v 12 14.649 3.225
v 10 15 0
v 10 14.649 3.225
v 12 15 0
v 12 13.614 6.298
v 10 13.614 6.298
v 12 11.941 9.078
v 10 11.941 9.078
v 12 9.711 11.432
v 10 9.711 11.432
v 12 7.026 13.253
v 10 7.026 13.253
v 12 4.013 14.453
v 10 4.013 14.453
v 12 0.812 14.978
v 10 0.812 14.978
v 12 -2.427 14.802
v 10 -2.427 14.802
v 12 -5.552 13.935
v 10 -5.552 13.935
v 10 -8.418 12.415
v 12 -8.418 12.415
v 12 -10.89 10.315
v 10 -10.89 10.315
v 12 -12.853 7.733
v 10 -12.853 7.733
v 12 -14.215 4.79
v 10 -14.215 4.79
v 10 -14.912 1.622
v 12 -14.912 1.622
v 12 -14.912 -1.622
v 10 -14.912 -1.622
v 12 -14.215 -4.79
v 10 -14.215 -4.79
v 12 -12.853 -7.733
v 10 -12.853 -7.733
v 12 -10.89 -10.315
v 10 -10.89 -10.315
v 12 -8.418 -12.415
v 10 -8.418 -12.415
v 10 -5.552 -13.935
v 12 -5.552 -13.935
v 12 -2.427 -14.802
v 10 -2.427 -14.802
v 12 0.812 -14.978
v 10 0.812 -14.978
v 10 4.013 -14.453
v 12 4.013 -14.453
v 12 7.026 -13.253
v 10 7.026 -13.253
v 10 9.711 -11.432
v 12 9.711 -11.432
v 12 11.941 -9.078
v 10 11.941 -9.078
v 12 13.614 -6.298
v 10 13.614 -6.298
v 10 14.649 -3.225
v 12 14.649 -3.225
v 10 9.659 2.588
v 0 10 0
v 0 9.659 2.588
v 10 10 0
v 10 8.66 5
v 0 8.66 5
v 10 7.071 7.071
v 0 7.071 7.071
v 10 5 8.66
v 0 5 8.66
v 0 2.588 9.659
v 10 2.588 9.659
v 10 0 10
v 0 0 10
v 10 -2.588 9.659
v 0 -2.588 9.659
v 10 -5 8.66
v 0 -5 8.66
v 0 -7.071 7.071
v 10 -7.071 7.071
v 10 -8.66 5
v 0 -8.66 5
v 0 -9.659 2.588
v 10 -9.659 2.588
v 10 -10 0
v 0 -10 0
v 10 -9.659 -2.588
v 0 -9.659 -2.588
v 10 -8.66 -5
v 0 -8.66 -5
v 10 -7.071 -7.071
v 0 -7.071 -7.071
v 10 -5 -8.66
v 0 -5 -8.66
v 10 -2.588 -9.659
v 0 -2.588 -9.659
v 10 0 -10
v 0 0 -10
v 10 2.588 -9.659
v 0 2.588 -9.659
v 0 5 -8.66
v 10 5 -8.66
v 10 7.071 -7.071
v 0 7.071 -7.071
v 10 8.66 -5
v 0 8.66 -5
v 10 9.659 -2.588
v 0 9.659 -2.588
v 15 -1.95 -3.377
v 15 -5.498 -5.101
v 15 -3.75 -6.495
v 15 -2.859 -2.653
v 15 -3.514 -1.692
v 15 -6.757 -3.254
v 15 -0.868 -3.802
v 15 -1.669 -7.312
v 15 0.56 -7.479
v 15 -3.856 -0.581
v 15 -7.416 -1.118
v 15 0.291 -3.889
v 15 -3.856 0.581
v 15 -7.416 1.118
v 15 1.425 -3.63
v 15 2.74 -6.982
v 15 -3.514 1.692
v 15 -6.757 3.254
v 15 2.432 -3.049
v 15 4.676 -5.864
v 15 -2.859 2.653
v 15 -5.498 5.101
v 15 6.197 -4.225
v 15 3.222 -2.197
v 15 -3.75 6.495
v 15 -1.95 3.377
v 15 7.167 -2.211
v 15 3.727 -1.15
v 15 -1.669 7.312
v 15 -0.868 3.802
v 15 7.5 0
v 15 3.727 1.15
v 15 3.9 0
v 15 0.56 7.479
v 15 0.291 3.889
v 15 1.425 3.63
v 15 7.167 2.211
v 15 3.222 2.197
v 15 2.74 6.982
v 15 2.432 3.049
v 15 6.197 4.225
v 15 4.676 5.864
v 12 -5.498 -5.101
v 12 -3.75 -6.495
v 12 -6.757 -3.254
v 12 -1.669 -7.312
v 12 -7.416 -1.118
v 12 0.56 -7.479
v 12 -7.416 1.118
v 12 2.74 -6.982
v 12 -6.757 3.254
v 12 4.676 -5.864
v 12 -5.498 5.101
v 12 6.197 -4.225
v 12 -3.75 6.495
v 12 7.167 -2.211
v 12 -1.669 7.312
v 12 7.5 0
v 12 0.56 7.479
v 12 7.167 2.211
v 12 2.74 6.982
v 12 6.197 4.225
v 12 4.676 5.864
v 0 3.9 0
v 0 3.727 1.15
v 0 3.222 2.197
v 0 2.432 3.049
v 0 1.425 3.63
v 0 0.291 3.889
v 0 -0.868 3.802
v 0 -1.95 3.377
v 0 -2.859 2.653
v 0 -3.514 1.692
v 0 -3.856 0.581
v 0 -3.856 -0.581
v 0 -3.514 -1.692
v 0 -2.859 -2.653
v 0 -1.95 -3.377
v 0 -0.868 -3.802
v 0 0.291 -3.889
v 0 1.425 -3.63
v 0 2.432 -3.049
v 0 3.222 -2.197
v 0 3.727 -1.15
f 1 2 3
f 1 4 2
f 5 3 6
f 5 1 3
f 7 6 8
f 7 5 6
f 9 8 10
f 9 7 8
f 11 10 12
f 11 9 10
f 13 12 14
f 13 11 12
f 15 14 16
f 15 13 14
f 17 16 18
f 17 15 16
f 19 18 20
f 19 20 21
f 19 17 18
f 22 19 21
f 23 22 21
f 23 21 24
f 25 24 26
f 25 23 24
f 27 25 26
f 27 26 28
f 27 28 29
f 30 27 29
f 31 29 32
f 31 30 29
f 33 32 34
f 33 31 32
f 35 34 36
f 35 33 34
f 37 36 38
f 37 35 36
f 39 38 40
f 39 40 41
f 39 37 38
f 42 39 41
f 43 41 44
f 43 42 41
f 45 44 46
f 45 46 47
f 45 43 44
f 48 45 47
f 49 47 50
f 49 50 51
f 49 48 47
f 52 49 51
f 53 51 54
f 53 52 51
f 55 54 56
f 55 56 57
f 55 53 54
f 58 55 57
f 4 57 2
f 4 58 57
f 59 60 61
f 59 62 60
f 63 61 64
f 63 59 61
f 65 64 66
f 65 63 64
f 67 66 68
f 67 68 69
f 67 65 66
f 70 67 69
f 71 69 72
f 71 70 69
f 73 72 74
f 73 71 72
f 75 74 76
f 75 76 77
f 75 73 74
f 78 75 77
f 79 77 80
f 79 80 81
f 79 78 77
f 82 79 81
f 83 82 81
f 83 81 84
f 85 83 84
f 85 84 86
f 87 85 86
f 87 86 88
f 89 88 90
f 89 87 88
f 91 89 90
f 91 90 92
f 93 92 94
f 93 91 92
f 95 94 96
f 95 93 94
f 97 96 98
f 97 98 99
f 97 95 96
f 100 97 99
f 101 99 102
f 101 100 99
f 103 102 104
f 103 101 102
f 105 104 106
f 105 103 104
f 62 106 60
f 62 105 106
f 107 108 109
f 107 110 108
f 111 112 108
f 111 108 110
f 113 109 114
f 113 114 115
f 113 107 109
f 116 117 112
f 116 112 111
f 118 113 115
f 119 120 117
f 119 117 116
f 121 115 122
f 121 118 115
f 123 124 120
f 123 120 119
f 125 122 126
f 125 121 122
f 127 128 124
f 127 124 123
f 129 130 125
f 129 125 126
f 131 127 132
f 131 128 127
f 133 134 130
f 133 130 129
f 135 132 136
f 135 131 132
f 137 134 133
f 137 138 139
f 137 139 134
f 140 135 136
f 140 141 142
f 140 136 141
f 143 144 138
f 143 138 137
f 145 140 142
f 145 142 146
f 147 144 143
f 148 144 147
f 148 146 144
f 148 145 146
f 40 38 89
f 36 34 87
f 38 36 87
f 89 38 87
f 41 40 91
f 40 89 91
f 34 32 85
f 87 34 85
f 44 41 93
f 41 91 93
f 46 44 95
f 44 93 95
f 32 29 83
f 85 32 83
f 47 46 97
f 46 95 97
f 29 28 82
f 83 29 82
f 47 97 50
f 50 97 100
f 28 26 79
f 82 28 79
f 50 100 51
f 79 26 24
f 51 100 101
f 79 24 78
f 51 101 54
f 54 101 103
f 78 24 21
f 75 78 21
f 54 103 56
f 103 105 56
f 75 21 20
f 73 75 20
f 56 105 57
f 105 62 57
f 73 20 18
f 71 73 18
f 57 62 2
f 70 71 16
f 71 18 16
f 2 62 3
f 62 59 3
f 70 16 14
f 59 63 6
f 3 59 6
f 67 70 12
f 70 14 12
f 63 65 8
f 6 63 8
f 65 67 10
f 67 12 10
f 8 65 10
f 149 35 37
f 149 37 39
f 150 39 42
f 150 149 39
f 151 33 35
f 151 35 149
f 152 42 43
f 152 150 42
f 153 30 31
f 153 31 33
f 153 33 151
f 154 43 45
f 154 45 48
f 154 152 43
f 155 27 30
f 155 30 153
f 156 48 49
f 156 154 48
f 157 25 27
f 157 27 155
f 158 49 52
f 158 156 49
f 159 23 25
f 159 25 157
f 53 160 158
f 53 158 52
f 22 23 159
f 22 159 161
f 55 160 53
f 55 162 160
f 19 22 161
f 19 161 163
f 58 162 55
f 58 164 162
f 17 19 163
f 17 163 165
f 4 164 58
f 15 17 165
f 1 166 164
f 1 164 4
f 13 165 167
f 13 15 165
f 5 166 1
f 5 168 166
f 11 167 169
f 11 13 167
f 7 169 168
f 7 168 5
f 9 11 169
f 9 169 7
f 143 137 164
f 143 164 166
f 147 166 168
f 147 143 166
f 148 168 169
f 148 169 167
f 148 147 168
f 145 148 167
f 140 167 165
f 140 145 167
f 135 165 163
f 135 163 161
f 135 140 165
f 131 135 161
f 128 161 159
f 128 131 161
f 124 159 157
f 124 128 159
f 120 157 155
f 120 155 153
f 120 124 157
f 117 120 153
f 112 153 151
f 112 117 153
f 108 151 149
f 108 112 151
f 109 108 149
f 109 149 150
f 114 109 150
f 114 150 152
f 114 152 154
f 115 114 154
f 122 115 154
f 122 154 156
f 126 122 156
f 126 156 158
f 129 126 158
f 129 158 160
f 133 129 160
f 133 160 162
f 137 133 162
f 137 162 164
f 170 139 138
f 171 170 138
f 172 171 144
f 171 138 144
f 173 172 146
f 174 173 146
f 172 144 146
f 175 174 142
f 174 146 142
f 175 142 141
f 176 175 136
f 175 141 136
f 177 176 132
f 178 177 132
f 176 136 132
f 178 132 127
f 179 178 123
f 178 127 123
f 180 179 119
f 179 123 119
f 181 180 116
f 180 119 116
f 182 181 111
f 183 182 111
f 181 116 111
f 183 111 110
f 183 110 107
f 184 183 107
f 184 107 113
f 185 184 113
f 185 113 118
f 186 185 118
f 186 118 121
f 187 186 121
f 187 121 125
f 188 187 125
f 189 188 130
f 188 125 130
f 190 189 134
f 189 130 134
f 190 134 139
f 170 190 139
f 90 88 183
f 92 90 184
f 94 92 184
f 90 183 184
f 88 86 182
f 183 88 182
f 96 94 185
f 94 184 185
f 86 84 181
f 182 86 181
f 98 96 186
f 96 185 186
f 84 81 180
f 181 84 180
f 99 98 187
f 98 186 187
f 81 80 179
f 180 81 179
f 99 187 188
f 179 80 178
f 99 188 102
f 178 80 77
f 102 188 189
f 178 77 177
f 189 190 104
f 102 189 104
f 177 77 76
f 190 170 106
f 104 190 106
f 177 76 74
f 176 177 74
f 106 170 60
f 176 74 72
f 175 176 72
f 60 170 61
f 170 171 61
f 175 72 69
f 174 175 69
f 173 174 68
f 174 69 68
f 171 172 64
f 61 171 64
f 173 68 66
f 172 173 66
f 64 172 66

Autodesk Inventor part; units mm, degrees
ref_plane "YZ Plane" through (0, 0, 0) normal (1, 0, 0) x (0, 1, 0)
ref_plane "XZ Plane" through (0, 0, 0) normal (0, 1, 0) x (-1, 0, 0)
ref_plane "XY Plane" through (0, 0, 0) normal (0, 0, 1) x (1, 0, 0)
sketch "Sketch1" plane through (0, 0, 0) normal (0, 0, 1) x (1, 0, 0)
  line L0 (0, 10) -> (10, 10)
  line L1 (10, 10) -> (10, 15)
  line L2 (10, 15) -> (12, 15)
  line L3 (12, 15) -> (12, 7.5)
  line L4 (12, 7.5) -> (15, 7.5)
  line L5 (0, 0) -> (21.5925, 0)
  line L6 (0, 10) -> (0, 3.9)
  line L7 (0, 3.9) -> (15, 3.9)
  line L8 (15, 7.5) -> (15, 3.9)
  point P0 (12, 11.25)
  dimension "d0" = 20
  dimension "d1" = 7.8
  dimension "d3" = 30
  dimension "d4" = 15
  dimension "d6" = 10
  dimension "d7" = 2
  dimension "d10" = 3
revolve "Revolution1" add sketch "Sketch1" angle 360 about axis through (0, 0, 0) along (1, 0, 0)
properties part number "SensorSkiva Plugg"
